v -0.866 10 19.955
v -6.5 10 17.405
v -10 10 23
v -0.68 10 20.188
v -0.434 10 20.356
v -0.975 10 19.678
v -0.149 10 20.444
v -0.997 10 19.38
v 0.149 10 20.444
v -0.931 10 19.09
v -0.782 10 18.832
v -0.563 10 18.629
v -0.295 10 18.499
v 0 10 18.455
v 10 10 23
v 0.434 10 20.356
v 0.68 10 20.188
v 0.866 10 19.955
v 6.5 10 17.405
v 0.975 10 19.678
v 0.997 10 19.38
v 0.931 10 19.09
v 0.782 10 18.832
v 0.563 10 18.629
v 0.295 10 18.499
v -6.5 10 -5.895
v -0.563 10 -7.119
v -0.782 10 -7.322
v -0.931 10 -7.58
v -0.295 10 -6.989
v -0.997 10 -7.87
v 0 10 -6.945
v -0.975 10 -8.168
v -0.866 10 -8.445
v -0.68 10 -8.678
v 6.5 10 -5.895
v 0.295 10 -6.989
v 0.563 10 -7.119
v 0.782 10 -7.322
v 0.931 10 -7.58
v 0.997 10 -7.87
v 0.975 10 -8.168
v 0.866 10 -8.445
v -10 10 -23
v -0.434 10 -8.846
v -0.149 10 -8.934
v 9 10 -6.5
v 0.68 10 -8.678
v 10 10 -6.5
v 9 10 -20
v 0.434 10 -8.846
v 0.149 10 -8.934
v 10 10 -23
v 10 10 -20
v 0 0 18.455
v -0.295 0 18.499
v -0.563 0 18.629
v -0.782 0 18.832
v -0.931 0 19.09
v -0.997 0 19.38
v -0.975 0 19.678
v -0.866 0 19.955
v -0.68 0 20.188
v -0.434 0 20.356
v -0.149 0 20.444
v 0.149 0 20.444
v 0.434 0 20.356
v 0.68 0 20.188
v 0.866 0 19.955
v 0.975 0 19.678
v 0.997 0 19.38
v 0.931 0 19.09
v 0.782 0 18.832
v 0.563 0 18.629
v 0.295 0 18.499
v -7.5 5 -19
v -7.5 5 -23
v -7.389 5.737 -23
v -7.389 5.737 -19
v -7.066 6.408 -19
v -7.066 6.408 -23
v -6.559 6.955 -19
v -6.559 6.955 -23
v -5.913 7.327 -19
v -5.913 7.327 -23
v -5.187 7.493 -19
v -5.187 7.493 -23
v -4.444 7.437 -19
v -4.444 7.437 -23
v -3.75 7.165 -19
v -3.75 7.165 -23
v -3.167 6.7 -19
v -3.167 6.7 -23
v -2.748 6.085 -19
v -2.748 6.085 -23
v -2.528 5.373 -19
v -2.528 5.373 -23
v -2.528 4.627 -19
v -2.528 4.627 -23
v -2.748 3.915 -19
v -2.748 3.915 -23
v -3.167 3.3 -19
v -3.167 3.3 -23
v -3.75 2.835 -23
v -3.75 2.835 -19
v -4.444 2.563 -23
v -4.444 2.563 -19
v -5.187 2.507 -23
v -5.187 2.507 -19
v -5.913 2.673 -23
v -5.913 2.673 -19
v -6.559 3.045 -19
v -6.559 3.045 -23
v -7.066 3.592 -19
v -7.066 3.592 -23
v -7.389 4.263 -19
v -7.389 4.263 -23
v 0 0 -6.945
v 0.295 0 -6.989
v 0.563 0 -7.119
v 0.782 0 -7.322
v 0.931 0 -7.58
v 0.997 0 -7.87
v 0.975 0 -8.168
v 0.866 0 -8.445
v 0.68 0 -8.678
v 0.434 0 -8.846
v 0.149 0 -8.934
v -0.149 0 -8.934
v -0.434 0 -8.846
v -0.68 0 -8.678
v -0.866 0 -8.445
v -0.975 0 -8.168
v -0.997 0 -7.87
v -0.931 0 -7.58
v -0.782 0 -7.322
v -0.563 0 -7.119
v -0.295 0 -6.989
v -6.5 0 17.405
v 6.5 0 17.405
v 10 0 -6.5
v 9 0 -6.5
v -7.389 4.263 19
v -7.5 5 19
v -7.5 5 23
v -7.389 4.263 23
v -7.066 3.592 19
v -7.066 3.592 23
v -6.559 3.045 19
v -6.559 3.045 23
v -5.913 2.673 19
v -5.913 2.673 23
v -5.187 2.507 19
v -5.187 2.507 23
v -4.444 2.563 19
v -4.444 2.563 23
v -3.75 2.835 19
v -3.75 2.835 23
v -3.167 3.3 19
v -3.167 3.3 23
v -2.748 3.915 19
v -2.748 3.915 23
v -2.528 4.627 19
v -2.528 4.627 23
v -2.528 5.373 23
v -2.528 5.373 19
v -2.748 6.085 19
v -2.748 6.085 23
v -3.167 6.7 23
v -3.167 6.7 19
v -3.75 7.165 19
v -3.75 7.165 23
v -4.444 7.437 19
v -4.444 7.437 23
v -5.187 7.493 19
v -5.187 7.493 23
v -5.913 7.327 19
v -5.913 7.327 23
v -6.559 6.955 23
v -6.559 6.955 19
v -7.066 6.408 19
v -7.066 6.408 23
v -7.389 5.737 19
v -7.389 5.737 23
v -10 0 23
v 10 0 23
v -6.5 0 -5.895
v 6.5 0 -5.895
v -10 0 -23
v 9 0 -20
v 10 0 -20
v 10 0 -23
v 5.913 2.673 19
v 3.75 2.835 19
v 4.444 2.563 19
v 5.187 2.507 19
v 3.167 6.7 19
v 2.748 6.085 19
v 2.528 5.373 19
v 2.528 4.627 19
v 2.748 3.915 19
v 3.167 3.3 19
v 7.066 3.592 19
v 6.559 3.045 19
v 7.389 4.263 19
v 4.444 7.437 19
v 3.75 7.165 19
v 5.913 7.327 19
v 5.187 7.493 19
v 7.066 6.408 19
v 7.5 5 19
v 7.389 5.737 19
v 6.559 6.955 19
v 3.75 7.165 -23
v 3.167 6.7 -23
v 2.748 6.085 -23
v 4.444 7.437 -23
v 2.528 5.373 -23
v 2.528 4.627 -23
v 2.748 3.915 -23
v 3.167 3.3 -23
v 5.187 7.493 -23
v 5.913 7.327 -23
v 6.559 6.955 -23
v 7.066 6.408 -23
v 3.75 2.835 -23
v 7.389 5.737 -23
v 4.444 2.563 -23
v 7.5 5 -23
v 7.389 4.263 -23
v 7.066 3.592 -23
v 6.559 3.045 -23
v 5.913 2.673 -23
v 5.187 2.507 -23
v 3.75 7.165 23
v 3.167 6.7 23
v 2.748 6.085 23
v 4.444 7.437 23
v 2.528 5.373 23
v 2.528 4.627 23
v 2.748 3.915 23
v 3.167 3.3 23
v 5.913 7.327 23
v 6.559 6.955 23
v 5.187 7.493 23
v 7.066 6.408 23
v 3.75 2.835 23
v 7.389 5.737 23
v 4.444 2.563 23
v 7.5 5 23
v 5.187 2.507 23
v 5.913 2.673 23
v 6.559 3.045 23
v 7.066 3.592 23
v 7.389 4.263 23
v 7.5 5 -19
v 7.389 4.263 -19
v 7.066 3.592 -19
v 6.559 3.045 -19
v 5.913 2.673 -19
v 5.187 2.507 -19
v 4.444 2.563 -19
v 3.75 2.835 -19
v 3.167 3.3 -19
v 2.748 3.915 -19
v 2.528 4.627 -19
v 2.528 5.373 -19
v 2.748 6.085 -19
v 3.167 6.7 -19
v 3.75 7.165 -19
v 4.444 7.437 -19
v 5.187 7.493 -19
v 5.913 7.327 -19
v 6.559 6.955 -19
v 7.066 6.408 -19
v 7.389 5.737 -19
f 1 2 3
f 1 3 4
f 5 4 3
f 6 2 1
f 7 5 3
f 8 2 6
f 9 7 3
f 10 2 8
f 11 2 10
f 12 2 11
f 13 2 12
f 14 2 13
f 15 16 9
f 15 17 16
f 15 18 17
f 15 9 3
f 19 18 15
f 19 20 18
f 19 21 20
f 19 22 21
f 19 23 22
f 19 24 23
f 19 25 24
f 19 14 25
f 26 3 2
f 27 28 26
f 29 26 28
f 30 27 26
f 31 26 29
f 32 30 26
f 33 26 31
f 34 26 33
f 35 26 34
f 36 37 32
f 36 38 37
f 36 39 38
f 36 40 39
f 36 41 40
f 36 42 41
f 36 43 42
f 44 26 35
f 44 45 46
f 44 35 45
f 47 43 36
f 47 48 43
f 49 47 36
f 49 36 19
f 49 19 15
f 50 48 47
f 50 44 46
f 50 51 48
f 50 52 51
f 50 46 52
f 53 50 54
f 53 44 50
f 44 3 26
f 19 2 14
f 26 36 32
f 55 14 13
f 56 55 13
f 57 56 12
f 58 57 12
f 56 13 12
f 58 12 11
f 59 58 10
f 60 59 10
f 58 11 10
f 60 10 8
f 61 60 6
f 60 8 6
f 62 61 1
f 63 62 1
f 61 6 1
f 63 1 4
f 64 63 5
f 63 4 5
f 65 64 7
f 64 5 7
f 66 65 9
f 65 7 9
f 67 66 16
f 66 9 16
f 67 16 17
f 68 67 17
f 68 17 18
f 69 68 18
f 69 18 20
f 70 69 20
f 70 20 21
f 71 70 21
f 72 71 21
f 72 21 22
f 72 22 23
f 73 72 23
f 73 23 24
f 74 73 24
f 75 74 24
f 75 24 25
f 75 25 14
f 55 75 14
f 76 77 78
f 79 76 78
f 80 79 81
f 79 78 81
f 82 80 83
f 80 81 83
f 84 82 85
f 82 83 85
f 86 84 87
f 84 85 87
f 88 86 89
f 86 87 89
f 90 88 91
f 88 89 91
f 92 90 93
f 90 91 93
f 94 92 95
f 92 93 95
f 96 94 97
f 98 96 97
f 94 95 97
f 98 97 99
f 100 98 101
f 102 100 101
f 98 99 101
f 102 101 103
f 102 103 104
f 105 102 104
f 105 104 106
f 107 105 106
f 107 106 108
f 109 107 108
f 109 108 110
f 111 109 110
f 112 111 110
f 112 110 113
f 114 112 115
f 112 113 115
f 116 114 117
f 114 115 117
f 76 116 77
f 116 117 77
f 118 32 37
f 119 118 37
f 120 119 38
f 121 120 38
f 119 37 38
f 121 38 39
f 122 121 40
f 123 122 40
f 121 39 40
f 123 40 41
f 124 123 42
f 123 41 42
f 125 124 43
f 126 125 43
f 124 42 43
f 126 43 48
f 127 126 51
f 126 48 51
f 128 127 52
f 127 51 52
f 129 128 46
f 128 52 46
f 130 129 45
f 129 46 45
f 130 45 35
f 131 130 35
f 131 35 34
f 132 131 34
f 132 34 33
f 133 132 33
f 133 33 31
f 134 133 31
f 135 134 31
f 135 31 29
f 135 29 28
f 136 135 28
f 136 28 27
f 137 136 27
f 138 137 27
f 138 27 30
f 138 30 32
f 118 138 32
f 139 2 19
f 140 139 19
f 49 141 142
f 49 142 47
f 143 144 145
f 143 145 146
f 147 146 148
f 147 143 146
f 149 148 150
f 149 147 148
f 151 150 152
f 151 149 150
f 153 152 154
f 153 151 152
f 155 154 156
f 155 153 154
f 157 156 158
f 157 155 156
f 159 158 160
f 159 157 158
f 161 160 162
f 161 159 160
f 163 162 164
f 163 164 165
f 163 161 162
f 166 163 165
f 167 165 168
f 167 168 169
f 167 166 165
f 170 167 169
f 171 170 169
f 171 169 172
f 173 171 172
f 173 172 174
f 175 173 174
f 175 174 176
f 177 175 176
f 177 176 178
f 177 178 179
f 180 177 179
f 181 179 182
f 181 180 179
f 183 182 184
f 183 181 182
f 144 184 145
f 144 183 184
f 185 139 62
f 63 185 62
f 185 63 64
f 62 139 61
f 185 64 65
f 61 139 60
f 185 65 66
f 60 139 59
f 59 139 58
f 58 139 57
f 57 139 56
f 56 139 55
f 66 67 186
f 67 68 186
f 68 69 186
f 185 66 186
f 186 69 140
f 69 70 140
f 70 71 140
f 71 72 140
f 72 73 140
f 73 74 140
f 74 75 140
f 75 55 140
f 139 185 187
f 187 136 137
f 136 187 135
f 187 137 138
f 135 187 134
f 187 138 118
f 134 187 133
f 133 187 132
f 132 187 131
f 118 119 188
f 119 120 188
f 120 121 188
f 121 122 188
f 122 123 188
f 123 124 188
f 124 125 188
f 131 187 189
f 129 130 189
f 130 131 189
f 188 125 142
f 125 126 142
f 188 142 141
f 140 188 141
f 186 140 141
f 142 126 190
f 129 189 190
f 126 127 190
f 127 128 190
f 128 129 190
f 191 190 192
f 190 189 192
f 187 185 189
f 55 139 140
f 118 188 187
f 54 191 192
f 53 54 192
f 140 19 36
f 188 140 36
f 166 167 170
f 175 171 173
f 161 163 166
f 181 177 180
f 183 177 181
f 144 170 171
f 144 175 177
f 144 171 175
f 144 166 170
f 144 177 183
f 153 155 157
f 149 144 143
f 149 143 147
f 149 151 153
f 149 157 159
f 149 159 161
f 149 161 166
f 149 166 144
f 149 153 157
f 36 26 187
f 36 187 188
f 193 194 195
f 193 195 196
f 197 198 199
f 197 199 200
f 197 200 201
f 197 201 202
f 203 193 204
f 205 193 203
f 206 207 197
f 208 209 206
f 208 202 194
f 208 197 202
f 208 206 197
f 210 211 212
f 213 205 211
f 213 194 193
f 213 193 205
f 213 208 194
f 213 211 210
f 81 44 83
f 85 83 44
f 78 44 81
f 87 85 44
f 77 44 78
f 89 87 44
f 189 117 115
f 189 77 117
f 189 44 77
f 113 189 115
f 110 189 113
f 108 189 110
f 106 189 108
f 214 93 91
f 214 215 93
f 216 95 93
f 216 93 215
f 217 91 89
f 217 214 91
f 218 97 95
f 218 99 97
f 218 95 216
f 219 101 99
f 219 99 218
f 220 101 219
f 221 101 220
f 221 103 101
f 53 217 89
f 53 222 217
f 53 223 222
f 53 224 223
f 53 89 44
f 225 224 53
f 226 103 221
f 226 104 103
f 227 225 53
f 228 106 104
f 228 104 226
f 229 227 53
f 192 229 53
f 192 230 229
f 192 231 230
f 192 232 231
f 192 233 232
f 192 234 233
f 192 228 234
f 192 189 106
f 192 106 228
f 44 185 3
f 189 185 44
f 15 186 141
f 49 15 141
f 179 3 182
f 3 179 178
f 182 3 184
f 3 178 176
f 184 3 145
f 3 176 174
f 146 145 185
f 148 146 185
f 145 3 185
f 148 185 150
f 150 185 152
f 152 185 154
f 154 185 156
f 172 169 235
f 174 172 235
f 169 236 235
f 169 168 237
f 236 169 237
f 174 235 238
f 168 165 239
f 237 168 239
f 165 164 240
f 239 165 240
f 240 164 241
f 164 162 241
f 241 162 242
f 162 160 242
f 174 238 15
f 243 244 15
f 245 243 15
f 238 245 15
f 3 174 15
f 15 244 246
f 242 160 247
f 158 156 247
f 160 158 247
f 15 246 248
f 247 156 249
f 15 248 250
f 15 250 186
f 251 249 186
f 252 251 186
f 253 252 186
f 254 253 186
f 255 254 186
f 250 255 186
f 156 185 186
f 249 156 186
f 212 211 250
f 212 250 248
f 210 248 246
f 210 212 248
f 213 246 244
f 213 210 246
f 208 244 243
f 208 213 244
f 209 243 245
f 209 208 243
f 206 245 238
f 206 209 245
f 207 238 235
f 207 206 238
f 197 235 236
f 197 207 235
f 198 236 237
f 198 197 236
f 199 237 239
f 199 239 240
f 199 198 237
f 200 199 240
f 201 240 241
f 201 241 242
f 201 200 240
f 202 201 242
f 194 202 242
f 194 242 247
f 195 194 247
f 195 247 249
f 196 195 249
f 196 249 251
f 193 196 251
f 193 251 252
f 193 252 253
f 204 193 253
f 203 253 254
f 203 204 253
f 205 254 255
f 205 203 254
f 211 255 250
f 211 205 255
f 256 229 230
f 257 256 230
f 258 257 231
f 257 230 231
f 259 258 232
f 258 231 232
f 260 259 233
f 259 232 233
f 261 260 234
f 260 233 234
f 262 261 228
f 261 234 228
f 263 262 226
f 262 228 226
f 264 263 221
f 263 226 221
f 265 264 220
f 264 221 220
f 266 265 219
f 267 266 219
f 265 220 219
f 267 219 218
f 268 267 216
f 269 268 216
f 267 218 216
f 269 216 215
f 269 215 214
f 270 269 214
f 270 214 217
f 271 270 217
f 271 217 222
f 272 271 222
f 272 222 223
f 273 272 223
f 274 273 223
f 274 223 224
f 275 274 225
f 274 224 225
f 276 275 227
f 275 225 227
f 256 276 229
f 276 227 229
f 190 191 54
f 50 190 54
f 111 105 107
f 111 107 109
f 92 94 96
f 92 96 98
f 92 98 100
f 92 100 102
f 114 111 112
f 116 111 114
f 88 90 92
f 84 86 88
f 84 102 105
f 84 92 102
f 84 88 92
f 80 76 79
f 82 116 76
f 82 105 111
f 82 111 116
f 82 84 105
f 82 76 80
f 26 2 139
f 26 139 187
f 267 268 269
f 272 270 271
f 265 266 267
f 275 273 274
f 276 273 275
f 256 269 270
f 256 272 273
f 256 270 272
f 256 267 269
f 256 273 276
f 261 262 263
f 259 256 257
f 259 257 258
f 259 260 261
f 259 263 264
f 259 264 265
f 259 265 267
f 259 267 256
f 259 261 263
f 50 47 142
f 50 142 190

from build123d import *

# Parameters (mm, degrees)
SKETCH1_W           = 20
SKETCH1_H           = 46
BOSS_EXTRUDE1_DEPTH = 10
SKETCH2_R           = 1
SKETCH2_W           = 13
SKETCH2_H           = 23.3
CUT_EXTRUDE1_DEPTH  = 28
SKETCH3_R           = 2.5
CUT_EXTRUDE2_DEPTH  = 4
CUT_EXTRUDE3_START  = -4
SKETCH4_R           = 2.5
CUT_EXTRUDE3_DEPTH  = 4
SKETCH5_W           = 13.5
SKETCH5_H           = 10
CUT_EXTRUDE4_DEPTH  = 1


with BuildPart() as part:
    # Sketch1 → Boss-Extrude1 (new body)
    with BuildSketch(Plane(origin=(0, 0, 0), x_dir=(1, 0, 0), z_dir=(0, 1, 0))):
        Rectangle(SKETCH1_W, SKETCH1_H)
    extrude(amount=BOSS_EXTRUDE1_DEPTH)

    # Sketch2 → Cut-Extrude1 (cut, through all)
    with BuildSketch(Plane(origin=(0, 10, 0), x_dir=(1, 0, 0), z_dir=(0, 1, 0))):
        with Locations(Location((0, 7.945, 0), (0, 0, 270))):
            Circle(SKETCH2_R)
        with Locations(Location((0, -19.455, 0), (0, 0, 90))):
            Circle(SKETCH2_R)
        with Locations((0, -5.755)):
            Rectangle(SKETCH2_W, SKETCH2_H)
    extrude(amount=-CUT_EXTRUDE1_DEPTH, mode=Mode.SUBTRACT)

    # Sketch3 → Cut-Extrude2 (cut)
    with BuildSketch(Plane(origin=(0, 0, -23), x_dir=(-1, 0, 0), z_dir=(0, 0, -1))):
        with Locations((5, 5)):
            Circle(SKETCH3_R)
        with Locations(Location((-5, 5, 0), (0, 0, 180))):
            Circle(SKETCH3_R)
    extrude(amount=-CUT_EXTRUDE2_DEPTH, mode=Mode.SUBTRACT)

    # Sketch4 → Cut-Extrude3 (cut)
    with BuildSketch(Plane.XY.offset(23).offset(CUT_EXTRUDE3_START)):
        with Locations((5, 5)):
            Circle(SKETCH4_R)
        with Locations(Location((-5, 5, 0), (0, 0, 180))):
            Circle(SKETCH4_R)
    extrude(amount=CUT_EXTRUDE3_DEPTH, mode=Mode.SUBTRACT)

    # Sketch5 → Cut-Extrude4 (cut)
    with BuildSketch(Plane(origin=(10, 0, 0), x_dir=(0, 0, -1), z_dir=(1, 0, 0))):
        with Locations((13.25, 5)):
            Rectangle(SKETCH5_W, SKETCH5_H)
    extrude(amount=-CUT_EXTRUDE4_DEPTH, mode=Mode.SUBTRACT)


solid = part.part
